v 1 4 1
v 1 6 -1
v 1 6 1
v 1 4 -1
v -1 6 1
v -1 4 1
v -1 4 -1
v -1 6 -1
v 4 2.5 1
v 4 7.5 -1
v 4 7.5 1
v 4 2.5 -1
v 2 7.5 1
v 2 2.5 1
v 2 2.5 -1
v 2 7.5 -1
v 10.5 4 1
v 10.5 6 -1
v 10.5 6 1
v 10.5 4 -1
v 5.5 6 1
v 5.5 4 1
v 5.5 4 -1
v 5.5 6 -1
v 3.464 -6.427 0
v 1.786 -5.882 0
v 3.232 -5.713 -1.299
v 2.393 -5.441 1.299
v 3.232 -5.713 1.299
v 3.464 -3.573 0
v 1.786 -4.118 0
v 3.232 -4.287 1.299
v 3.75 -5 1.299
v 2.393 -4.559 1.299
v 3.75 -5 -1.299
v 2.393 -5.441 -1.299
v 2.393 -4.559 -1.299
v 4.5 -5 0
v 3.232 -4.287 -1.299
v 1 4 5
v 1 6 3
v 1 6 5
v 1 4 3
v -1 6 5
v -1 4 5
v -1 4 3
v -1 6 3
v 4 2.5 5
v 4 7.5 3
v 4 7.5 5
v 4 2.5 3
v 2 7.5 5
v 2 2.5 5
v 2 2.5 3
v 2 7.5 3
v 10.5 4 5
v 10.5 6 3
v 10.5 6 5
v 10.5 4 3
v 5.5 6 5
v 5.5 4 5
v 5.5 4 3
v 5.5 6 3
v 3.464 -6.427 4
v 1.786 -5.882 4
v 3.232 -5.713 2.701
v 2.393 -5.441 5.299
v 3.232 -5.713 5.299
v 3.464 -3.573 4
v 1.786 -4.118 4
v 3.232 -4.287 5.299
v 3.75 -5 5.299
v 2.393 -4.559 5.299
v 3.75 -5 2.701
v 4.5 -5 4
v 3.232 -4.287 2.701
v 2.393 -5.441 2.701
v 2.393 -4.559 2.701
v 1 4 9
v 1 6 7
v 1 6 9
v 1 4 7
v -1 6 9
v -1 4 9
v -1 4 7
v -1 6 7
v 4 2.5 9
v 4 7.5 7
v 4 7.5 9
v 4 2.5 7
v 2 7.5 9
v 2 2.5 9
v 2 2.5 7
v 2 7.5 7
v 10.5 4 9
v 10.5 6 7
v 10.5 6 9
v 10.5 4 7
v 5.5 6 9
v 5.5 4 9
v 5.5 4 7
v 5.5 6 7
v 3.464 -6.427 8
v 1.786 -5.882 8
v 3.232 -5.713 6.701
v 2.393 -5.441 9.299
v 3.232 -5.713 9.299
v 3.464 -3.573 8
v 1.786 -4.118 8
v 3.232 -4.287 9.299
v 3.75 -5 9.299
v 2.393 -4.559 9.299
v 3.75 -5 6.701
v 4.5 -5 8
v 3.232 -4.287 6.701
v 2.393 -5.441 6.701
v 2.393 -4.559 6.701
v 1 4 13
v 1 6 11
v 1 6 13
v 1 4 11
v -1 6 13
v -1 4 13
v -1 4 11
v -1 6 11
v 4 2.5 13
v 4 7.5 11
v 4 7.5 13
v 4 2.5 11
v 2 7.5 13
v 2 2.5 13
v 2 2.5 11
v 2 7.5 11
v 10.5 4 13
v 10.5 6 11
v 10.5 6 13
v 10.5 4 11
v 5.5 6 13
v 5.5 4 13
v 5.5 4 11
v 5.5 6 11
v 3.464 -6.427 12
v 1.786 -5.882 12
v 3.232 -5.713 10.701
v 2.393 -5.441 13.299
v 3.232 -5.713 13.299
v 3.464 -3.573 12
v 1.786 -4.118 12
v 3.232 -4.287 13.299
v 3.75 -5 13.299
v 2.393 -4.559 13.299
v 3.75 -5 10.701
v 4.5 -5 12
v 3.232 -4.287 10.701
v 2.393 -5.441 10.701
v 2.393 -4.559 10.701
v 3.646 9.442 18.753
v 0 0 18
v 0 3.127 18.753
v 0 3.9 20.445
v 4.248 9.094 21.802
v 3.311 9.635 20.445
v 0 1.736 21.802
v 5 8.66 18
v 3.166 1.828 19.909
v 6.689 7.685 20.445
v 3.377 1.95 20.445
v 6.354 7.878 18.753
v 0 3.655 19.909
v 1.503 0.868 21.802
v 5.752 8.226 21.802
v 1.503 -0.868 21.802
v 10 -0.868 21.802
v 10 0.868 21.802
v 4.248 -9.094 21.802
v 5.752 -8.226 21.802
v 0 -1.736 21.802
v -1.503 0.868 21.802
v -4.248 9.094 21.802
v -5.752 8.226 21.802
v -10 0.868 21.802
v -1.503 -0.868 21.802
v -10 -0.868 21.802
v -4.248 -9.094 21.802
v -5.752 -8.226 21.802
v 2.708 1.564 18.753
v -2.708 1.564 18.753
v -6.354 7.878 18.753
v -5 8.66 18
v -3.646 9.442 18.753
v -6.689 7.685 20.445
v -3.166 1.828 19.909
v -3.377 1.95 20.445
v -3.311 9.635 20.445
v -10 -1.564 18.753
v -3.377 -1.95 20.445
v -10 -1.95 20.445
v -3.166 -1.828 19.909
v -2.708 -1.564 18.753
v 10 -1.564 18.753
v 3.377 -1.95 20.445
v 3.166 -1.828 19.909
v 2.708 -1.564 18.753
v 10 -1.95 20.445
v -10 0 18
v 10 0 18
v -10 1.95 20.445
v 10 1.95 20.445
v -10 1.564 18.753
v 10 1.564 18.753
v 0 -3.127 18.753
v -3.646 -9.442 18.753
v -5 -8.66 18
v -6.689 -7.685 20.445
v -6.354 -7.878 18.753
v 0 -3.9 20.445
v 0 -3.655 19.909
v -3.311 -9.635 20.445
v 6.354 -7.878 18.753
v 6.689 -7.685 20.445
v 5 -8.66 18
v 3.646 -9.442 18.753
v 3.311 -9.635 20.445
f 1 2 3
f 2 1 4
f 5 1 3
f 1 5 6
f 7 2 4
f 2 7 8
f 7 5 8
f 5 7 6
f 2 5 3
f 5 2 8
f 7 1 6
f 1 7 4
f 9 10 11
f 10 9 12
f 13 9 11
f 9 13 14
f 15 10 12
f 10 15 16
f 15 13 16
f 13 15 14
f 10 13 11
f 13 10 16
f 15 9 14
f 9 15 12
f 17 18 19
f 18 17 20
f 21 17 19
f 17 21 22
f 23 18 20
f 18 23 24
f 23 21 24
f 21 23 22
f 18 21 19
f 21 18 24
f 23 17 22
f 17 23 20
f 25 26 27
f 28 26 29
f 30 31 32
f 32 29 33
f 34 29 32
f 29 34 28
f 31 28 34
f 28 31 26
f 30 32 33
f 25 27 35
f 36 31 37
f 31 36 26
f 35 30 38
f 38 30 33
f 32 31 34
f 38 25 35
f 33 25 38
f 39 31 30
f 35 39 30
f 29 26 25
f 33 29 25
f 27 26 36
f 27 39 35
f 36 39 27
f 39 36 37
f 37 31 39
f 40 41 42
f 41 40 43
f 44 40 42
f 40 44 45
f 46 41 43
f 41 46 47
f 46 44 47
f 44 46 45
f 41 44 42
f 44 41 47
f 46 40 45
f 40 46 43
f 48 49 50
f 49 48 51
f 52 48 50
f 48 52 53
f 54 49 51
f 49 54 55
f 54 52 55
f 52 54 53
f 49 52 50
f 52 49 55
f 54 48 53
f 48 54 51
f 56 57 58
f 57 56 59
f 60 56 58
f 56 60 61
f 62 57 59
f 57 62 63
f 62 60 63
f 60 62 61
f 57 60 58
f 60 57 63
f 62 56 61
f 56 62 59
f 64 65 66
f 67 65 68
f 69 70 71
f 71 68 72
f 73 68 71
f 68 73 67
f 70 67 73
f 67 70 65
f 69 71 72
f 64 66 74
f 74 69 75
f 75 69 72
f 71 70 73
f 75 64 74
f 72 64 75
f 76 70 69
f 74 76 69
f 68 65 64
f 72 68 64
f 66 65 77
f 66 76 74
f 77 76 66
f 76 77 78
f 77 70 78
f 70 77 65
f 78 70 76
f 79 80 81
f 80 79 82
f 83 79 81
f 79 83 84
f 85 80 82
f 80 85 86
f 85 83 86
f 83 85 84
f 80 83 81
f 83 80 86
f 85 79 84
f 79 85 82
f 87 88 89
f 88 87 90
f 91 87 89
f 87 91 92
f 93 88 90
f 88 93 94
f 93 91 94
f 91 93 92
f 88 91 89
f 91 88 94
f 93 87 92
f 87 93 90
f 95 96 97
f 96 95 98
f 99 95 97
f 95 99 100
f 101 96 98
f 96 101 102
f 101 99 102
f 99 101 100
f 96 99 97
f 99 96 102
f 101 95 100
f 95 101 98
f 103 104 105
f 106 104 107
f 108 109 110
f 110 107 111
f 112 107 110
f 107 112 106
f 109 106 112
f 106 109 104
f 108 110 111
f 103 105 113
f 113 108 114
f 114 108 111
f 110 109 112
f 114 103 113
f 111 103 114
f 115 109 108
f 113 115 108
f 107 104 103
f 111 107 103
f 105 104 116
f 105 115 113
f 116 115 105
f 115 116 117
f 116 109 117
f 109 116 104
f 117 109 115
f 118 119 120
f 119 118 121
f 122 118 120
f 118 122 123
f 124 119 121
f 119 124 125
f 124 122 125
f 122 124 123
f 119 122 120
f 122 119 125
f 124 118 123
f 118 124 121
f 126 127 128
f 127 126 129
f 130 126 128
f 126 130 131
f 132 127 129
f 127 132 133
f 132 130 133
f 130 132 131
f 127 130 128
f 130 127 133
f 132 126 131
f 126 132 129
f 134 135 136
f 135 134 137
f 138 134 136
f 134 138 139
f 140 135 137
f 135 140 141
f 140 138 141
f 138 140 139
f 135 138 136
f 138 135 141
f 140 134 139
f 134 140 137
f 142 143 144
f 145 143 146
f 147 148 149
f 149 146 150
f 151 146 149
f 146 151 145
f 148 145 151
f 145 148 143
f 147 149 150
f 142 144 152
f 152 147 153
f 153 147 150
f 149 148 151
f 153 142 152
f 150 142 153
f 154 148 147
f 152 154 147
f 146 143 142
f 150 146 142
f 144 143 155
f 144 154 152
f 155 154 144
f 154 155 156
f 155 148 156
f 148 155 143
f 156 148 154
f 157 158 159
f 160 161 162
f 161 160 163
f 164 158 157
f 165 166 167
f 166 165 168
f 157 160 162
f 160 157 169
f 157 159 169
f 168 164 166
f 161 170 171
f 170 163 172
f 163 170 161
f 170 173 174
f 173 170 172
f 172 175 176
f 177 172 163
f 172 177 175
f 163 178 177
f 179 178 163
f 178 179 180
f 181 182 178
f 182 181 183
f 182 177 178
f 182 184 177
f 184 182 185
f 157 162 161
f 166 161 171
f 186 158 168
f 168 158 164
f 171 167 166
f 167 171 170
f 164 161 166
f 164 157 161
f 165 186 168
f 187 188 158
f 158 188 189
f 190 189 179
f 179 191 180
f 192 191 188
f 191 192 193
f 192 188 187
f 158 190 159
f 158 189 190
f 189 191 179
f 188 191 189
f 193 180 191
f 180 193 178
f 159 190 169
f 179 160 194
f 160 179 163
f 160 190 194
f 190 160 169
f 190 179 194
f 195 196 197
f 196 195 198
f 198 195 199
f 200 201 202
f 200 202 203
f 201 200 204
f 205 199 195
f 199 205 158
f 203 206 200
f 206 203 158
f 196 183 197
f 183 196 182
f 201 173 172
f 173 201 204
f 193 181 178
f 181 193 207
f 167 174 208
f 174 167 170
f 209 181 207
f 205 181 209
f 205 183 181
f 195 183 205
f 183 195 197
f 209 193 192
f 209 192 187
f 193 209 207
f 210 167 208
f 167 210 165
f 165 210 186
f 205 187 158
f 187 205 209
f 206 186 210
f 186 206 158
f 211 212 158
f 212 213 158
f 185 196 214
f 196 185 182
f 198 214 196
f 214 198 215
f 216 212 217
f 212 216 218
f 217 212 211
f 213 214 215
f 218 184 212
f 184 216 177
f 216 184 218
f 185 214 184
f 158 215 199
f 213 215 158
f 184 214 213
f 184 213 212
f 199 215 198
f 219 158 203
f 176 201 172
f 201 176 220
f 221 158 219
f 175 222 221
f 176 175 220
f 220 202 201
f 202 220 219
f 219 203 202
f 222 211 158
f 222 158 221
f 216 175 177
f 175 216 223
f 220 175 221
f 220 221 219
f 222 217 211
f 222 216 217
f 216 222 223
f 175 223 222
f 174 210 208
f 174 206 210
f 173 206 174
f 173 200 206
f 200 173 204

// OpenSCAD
/*

Sage Ridge Robotics OpenSCAD file.
Christopher von Nagy, July 2014.

Example 04 sets.

*/


// Creating sets of objects
// You'll recognize the for() loop from Processing, though
// its syntax is a bit different. The loop is used to
// create sets of objects. Here, [0 : 4 : 12] means start at zero
// and count by 4s to 12. [0 : 12] would mean count by ones, and
// [0 : 0.5 : 12] would mean count by halves.

for (i = [0 : 4 : 12])
{

    translate([0,5,i]) cube(size = 2, center = true);
    translate([3,5,i]) cube([2,5,2], center = true);
    translate([8,5,i]) cube([5,2,2], center = true);
    translate([3,-5,i]) sphere(d = 3, center = true);

}

// rotate() allows you to spin objects around
// rotation takes three variables: degrees of rotation
// about the x axis, y axis, and z axis.

// Which direction do objects rotate? Clockwise? Counter clockwise?

for(i = [1 : 6])
{
    translate([0,0,20])
    rotate([0,90,60 * i])
    cylinder(r=2,h=10,center = false);
}

/*

License code:

Creative Commons Atribution 4.0

Attribution — You must give appropriate credit, provide a link to the license, and indicate if changes were made. You may do so in any reasonable manner, but not in any way that suggests the licensor endorses you or your use.

No additional restrictions — You may not apply legal terms or technological measures that legally restrict others from doing anything the license permits.


*/
